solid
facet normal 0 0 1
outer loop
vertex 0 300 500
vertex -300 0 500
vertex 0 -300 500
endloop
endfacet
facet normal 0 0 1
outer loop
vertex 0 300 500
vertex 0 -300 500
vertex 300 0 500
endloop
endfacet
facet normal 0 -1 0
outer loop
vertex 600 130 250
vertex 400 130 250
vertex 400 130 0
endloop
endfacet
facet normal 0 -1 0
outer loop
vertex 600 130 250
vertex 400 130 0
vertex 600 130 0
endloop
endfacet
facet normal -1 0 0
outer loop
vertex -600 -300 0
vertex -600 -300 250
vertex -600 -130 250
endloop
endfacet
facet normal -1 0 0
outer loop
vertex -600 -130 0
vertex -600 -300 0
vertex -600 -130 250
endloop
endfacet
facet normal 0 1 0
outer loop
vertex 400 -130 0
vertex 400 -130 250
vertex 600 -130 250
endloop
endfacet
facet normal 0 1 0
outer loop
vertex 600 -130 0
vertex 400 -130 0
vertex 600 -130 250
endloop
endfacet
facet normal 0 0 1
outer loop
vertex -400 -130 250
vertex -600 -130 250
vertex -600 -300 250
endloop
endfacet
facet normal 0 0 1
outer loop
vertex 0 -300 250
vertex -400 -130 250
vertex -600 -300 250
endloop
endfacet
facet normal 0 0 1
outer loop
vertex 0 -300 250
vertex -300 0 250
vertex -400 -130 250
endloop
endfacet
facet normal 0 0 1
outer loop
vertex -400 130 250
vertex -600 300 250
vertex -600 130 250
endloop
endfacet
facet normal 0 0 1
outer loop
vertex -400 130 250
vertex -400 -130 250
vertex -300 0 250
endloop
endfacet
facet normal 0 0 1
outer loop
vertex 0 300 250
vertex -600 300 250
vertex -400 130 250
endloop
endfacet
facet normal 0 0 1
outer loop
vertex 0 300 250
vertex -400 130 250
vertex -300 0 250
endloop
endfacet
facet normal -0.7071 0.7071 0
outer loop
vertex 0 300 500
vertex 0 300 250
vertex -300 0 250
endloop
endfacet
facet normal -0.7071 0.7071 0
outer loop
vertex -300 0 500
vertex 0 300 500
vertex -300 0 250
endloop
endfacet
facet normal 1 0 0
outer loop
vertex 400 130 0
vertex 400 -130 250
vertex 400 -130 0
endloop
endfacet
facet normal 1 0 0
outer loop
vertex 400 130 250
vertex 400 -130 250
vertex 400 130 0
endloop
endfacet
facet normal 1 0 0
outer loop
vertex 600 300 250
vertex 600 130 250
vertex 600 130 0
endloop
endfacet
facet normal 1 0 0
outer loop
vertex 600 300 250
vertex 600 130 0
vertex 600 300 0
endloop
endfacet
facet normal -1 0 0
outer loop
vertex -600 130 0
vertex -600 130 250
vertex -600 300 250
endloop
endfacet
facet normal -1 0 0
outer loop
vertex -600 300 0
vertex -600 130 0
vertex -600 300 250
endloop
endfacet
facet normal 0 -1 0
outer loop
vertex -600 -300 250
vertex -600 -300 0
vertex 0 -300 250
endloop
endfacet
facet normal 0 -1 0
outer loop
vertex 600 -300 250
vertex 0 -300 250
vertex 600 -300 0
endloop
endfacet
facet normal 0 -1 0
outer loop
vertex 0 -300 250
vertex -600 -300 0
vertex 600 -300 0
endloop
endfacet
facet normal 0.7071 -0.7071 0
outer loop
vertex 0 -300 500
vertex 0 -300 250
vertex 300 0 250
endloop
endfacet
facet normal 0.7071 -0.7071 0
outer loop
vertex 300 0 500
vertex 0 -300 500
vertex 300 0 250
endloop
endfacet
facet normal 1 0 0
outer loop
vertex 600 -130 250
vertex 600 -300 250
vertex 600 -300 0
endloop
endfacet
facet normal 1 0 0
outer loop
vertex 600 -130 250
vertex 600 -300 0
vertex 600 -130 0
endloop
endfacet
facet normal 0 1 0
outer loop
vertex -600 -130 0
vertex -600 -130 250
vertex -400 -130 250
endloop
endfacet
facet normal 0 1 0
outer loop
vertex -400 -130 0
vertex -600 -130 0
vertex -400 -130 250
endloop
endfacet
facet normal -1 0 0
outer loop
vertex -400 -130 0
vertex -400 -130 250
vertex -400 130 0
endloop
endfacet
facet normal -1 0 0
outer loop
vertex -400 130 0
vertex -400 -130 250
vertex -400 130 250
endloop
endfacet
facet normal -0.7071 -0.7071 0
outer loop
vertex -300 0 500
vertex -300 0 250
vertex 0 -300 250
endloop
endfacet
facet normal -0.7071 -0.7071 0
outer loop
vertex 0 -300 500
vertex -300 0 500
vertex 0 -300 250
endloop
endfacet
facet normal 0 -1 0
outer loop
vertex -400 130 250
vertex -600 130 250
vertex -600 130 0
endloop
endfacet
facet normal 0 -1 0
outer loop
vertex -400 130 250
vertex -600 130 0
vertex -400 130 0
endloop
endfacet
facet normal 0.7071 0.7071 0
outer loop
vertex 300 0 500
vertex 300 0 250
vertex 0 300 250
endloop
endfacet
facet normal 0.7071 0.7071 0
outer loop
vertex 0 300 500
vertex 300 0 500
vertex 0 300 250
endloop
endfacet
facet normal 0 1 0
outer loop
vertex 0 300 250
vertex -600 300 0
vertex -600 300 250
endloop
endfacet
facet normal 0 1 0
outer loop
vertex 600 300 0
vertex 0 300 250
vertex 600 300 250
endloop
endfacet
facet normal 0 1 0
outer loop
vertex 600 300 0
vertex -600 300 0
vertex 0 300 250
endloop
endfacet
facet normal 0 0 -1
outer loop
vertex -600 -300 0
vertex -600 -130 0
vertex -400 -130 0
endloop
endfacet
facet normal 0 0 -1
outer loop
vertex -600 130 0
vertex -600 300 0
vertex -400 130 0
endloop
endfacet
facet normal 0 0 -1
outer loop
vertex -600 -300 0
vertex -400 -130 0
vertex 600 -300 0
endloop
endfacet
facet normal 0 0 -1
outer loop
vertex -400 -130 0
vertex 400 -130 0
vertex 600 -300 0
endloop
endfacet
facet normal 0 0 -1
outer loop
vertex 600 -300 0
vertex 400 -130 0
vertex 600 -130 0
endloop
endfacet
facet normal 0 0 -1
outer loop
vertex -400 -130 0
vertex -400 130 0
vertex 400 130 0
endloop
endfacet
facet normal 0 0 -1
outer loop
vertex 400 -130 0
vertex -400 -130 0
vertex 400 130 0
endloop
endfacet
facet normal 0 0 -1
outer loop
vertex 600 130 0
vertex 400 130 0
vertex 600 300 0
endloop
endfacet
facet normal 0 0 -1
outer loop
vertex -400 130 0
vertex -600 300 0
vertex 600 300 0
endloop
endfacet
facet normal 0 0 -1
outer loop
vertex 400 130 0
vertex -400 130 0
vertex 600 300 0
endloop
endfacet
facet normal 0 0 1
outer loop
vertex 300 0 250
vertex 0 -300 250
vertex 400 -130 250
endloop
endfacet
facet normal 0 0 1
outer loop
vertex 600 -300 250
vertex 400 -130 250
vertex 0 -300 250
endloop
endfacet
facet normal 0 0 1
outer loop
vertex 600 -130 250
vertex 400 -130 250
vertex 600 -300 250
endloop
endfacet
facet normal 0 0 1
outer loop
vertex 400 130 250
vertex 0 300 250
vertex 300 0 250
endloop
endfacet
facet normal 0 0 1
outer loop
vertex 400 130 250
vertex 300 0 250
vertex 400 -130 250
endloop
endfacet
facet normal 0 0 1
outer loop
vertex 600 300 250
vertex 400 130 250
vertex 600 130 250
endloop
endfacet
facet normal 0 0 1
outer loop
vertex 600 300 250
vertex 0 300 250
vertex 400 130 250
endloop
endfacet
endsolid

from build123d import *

# Parameters (mm, degrees)
F0_W     = 1200
F0_H     = 600
F1_DEPTH = 250
F3_DEPTH = 250
F4_W     = 400
F4_H     = 260
F5_DEPTH = 250.001
F6_W     = 400
F6_H     = 260
F7_DEPTH = 250.001


with BuildPart() as f1:
    # F0 (on Top) → F1 (new body)
    with BuildSketch(Plane.XY):
        Rectangle(F0_W, F0_H)
    extrude(amount=F1_DEPTH)

    # F2 (on face) → F3 (join)
    with BuildSketch(Plane.XY.offset(250)):
        Polygon((300, 0), (0, 300), (-300, 0), (0, -300), align=None)
    extrude(amount=F3_DEPTH)

    # F4 (on face) → F5 (cut, through all)
    with BuildSketch(Plane.XY.offset(250)):
        with Locations((-600, 0)):
            Rectangle(F4_W, F4_H)
    extrude(amount=-F5_DEPTH, mode=Mode.SUBTRACT)

    # F6 (on face) → F7 (cut, through all)
    with BuildSketch(Plane.XY.offset(250)):
        with Locations((600, 0)):
            Rectangle(F6_W, F6_H)
    extrude(amount=-F7_DEPTH, mode=Mode.SUBTRACT)


solid = f1.part
